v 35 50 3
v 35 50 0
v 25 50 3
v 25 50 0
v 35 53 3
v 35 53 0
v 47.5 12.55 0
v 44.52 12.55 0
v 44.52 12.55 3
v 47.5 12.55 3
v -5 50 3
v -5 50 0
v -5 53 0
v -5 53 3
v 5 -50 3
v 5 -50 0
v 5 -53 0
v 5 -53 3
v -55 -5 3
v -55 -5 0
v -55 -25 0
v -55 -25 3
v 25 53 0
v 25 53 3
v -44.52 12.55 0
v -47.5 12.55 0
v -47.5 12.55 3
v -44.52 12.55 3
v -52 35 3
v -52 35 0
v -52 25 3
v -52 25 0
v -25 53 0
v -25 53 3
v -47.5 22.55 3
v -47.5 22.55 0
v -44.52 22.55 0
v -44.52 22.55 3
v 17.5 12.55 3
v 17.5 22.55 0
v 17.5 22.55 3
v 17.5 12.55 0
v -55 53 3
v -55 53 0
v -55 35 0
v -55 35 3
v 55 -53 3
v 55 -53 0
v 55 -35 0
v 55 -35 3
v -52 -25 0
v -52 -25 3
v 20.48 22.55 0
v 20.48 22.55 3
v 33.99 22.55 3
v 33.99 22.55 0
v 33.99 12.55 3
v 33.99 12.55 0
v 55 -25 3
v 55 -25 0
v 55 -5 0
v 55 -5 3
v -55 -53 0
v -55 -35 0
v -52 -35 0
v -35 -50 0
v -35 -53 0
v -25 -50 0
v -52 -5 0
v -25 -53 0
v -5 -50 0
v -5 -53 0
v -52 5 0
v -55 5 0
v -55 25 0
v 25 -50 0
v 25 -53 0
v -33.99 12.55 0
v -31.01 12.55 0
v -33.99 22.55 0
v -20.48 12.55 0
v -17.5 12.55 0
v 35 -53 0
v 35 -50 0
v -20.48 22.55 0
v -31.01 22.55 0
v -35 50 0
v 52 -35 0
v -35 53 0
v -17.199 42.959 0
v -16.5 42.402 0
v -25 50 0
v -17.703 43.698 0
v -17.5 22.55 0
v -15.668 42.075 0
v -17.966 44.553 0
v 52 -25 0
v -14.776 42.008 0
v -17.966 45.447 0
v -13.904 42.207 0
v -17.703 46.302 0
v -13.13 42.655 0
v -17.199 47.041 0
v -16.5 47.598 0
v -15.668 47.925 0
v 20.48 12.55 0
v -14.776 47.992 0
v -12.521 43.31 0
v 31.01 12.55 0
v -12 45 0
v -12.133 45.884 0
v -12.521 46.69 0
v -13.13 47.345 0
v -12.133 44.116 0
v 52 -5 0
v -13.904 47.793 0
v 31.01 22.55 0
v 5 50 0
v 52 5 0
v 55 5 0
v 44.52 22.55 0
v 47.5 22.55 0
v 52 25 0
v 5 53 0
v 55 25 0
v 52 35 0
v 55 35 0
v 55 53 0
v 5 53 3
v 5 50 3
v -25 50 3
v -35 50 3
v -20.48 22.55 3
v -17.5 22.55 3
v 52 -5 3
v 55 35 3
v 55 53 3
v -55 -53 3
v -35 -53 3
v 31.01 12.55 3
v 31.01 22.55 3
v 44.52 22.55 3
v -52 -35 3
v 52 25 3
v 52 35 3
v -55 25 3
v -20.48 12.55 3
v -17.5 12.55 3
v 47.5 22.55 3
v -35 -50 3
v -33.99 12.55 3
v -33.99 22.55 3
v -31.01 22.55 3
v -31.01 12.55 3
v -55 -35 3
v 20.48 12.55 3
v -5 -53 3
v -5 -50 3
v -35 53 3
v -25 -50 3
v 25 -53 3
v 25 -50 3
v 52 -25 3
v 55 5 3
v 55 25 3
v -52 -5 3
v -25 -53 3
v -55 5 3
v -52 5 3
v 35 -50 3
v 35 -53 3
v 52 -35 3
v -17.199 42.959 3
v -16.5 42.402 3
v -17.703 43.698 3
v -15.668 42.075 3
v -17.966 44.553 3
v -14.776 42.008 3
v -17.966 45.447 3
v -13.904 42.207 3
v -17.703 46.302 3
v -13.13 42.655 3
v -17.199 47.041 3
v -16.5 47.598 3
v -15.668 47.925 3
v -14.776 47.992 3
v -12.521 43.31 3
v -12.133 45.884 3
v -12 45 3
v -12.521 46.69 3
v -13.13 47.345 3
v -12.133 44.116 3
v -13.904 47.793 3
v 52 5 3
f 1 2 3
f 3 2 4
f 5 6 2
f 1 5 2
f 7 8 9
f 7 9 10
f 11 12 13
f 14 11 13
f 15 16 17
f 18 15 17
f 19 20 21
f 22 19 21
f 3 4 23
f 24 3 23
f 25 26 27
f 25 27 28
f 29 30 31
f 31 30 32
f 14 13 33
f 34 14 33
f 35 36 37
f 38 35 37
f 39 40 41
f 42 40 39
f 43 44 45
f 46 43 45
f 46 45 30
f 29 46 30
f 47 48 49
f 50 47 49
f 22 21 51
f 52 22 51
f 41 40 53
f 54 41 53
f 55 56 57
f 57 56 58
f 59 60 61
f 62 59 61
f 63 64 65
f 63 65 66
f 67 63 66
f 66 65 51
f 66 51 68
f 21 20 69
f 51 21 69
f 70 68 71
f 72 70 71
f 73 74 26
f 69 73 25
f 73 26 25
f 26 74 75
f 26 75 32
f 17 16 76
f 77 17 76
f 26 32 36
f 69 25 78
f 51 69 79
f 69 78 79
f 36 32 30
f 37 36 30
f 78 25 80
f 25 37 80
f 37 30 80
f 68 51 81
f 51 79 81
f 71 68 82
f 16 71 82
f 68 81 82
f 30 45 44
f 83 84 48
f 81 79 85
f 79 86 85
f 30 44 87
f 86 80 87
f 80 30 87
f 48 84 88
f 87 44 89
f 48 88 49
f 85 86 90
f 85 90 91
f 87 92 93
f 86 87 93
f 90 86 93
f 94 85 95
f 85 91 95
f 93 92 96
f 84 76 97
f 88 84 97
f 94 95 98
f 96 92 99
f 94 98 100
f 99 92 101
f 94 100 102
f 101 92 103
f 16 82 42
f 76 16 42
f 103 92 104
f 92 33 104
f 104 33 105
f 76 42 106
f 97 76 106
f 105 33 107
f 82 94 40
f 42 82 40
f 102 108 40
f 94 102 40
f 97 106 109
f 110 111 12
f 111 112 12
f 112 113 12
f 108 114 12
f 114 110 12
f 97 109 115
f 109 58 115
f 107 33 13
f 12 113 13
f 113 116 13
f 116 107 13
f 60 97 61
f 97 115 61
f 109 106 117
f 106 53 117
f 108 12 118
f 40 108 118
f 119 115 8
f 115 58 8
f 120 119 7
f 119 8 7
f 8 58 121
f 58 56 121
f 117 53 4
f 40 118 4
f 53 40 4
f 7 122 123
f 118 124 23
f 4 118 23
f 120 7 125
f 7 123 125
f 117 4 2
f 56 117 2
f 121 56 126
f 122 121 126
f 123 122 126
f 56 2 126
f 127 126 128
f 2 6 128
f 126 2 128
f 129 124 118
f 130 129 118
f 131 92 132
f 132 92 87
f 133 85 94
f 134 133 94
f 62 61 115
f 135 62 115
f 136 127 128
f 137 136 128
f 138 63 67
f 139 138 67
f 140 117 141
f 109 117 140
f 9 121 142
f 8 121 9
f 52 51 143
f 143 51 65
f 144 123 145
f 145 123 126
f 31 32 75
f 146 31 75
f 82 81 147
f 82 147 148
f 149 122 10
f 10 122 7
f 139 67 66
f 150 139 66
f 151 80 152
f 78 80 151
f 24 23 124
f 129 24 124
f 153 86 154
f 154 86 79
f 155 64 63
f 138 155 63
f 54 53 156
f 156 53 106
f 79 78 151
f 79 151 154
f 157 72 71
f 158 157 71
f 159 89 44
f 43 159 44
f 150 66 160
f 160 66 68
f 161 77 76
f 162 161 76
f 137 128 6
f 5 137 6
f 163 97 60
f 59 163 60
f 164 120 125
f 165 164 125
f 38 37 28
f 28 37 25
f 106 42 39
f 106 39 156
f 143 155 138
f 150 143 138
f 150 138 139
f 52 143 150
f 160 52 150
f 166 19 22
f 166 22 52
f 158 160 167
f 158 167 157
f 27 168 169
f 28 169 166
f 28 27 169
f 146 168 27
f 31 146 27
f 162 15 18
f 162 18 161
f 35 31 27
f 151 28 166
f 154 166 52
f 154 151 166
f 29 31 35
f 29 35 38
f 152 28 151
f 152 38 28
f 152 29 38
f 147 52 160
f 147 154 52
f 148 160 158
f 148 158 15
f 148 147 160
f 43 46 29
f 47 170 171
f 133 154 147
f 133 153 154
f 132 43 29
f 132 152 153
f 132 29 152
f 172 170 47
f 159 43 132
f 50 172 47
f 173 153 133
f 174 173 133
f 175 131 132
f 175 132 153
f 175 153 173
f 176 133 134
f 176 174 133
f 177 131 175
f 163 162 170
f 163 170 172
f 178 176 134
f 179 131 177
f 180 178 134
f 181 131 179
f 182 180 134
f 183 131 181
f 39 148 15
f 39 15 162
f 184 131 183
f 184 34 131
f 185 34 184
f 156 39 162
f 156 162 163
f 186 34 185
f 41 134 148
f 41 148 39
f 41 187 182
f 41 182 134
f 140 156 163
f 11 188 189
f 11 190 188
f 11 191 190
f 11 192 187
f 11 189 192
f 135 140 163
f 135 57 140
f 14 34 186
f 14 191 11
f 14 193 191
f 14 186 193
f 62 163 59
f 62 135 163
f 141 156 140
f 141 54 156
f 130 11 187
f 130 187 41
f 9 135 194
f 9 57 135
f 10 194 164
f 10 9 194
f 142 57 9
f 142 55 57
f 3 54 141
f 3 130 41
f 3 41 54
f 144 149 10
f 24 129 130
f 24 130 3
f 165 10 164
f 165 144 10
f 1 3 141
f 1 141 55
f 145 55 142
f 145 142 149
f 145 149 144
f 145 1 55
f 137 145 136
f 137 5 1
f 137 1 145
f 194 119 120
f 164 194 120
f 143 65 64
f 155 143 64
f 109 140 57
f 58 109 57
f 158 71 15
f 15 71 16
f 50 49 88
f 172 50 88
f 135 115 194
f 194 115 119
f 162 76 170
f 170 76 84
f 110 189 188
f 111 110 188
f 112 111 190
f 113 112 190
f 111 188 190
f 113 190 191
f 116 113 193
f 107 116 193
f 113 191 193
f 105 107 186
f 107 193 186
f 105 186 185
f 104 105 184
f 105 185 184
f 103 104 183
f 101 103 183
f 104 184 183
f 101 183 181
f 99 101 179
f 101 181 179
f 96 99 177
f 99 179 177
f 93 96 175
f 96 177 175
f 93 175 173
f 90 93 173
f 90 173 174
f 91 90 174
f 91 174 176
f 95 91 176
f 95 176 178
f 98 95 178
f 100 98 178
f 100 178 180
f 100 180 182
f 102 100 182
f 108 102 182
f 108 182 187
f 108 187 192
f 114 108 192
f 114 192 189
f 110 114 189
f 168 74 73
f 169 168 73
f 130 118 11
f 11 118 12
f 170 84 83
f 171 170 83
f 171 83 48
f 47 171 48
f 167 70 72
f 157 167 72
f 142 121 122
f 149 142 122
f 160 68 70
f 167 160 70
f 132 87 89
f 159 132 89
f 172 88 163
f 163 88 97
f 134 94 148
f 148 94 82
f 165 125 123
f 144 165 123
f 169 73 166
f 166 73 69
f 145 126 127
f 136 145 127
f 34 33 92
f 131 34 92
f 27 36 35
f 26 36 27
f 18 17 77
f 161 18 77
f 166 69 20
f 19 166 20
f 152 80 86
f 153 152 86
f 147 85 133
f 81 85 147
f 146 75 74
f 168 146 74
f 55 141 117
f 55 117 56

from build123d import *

# Parameters (mm, degrees)
F1_DEPTH = 3
F2_W     = 2.98
F2_H     = 10
F3_DEPTH = 25
F4_R     = 3
F5_DEPTH = 25


with BuildPart() as f1:
    # F0 (on Top) → F1 (new body)
    with BuildSketch(Plane.XY):
        Polygon((35, -53), (55, -53), (55, -35), (52, -35), (52, -25), (55, -25), (55, -5), (52, -5), (52, 5), (55, 5), (55, 25), (52, 25), (52, 35), (55, 35), (55, 53), (35, 53), (35, 52), (35, 50), (25, 50), (25, 52), (25, 53), (5, 53), (5, 52), (5, 50), (-5, 50), (-5, 52), (-5, 53), (-25, 53), (-25, 52), (-25, 50), (-35, 50), (-35, 52), (-35, 53), (-55, 53), (-55, 35), (-52, 35), (-52, 25), (-55, 25), (-55, 5), (-52, 5), (-52, -5), (-55, -5), (-55, -25), (-52, -25), (-52, -35), (-55, -35), (-55, -53), (-35, -53), (-35, -52), (-35, -50), (-25, -50), (-25, -52), (-25, -53), (-5, -53), (-5, -52), (-5, -50), (5, -50), (5, -52), (5, -53), (25, -53), (25, -52), (25, -50), (35, -50), (35, -52), align=None)
    extrude(amount=F1_DEPTH)

    # F2 (on face) → F3 (cut)
    with BuildSketch(Plane(origin=(0, 0, 0), x_dir=(1, 0, 0), z_dir=(0, 0, -1))):
        with Locations((-46.01, -17.55)):
            Rectangle(F2_W, F2_H)
        with Locations((-32.5, -17.55)):
            Rectangle(F2_W, F2_H)
        with Locations((-18.99, -17.55)):
            Rectangle(F2_W, F2_H)
        with Locations((18.99, -17.55)):
            Rectangle(F2_W, F2_H)
        with Locations((32.5, -17.55)):
            Rectangle(F2_W, F2_H)
        with Locations((46.01, -17.55)):
            Rectangle(F2_W, F2_H)
    extrude(amount=-F3_DEPTH, mode=Mode.SUBTRACT)

    # F4 (on face) → F5 (cut)
    with BuildSketch(Plane.XY.offset(3)):
        with Locations((-15, 45)):
            Circle(F4_R)
    extrude(amount=-F5_DEPTH, mode=Mode.SUBTRACT)


solid = f1.part
